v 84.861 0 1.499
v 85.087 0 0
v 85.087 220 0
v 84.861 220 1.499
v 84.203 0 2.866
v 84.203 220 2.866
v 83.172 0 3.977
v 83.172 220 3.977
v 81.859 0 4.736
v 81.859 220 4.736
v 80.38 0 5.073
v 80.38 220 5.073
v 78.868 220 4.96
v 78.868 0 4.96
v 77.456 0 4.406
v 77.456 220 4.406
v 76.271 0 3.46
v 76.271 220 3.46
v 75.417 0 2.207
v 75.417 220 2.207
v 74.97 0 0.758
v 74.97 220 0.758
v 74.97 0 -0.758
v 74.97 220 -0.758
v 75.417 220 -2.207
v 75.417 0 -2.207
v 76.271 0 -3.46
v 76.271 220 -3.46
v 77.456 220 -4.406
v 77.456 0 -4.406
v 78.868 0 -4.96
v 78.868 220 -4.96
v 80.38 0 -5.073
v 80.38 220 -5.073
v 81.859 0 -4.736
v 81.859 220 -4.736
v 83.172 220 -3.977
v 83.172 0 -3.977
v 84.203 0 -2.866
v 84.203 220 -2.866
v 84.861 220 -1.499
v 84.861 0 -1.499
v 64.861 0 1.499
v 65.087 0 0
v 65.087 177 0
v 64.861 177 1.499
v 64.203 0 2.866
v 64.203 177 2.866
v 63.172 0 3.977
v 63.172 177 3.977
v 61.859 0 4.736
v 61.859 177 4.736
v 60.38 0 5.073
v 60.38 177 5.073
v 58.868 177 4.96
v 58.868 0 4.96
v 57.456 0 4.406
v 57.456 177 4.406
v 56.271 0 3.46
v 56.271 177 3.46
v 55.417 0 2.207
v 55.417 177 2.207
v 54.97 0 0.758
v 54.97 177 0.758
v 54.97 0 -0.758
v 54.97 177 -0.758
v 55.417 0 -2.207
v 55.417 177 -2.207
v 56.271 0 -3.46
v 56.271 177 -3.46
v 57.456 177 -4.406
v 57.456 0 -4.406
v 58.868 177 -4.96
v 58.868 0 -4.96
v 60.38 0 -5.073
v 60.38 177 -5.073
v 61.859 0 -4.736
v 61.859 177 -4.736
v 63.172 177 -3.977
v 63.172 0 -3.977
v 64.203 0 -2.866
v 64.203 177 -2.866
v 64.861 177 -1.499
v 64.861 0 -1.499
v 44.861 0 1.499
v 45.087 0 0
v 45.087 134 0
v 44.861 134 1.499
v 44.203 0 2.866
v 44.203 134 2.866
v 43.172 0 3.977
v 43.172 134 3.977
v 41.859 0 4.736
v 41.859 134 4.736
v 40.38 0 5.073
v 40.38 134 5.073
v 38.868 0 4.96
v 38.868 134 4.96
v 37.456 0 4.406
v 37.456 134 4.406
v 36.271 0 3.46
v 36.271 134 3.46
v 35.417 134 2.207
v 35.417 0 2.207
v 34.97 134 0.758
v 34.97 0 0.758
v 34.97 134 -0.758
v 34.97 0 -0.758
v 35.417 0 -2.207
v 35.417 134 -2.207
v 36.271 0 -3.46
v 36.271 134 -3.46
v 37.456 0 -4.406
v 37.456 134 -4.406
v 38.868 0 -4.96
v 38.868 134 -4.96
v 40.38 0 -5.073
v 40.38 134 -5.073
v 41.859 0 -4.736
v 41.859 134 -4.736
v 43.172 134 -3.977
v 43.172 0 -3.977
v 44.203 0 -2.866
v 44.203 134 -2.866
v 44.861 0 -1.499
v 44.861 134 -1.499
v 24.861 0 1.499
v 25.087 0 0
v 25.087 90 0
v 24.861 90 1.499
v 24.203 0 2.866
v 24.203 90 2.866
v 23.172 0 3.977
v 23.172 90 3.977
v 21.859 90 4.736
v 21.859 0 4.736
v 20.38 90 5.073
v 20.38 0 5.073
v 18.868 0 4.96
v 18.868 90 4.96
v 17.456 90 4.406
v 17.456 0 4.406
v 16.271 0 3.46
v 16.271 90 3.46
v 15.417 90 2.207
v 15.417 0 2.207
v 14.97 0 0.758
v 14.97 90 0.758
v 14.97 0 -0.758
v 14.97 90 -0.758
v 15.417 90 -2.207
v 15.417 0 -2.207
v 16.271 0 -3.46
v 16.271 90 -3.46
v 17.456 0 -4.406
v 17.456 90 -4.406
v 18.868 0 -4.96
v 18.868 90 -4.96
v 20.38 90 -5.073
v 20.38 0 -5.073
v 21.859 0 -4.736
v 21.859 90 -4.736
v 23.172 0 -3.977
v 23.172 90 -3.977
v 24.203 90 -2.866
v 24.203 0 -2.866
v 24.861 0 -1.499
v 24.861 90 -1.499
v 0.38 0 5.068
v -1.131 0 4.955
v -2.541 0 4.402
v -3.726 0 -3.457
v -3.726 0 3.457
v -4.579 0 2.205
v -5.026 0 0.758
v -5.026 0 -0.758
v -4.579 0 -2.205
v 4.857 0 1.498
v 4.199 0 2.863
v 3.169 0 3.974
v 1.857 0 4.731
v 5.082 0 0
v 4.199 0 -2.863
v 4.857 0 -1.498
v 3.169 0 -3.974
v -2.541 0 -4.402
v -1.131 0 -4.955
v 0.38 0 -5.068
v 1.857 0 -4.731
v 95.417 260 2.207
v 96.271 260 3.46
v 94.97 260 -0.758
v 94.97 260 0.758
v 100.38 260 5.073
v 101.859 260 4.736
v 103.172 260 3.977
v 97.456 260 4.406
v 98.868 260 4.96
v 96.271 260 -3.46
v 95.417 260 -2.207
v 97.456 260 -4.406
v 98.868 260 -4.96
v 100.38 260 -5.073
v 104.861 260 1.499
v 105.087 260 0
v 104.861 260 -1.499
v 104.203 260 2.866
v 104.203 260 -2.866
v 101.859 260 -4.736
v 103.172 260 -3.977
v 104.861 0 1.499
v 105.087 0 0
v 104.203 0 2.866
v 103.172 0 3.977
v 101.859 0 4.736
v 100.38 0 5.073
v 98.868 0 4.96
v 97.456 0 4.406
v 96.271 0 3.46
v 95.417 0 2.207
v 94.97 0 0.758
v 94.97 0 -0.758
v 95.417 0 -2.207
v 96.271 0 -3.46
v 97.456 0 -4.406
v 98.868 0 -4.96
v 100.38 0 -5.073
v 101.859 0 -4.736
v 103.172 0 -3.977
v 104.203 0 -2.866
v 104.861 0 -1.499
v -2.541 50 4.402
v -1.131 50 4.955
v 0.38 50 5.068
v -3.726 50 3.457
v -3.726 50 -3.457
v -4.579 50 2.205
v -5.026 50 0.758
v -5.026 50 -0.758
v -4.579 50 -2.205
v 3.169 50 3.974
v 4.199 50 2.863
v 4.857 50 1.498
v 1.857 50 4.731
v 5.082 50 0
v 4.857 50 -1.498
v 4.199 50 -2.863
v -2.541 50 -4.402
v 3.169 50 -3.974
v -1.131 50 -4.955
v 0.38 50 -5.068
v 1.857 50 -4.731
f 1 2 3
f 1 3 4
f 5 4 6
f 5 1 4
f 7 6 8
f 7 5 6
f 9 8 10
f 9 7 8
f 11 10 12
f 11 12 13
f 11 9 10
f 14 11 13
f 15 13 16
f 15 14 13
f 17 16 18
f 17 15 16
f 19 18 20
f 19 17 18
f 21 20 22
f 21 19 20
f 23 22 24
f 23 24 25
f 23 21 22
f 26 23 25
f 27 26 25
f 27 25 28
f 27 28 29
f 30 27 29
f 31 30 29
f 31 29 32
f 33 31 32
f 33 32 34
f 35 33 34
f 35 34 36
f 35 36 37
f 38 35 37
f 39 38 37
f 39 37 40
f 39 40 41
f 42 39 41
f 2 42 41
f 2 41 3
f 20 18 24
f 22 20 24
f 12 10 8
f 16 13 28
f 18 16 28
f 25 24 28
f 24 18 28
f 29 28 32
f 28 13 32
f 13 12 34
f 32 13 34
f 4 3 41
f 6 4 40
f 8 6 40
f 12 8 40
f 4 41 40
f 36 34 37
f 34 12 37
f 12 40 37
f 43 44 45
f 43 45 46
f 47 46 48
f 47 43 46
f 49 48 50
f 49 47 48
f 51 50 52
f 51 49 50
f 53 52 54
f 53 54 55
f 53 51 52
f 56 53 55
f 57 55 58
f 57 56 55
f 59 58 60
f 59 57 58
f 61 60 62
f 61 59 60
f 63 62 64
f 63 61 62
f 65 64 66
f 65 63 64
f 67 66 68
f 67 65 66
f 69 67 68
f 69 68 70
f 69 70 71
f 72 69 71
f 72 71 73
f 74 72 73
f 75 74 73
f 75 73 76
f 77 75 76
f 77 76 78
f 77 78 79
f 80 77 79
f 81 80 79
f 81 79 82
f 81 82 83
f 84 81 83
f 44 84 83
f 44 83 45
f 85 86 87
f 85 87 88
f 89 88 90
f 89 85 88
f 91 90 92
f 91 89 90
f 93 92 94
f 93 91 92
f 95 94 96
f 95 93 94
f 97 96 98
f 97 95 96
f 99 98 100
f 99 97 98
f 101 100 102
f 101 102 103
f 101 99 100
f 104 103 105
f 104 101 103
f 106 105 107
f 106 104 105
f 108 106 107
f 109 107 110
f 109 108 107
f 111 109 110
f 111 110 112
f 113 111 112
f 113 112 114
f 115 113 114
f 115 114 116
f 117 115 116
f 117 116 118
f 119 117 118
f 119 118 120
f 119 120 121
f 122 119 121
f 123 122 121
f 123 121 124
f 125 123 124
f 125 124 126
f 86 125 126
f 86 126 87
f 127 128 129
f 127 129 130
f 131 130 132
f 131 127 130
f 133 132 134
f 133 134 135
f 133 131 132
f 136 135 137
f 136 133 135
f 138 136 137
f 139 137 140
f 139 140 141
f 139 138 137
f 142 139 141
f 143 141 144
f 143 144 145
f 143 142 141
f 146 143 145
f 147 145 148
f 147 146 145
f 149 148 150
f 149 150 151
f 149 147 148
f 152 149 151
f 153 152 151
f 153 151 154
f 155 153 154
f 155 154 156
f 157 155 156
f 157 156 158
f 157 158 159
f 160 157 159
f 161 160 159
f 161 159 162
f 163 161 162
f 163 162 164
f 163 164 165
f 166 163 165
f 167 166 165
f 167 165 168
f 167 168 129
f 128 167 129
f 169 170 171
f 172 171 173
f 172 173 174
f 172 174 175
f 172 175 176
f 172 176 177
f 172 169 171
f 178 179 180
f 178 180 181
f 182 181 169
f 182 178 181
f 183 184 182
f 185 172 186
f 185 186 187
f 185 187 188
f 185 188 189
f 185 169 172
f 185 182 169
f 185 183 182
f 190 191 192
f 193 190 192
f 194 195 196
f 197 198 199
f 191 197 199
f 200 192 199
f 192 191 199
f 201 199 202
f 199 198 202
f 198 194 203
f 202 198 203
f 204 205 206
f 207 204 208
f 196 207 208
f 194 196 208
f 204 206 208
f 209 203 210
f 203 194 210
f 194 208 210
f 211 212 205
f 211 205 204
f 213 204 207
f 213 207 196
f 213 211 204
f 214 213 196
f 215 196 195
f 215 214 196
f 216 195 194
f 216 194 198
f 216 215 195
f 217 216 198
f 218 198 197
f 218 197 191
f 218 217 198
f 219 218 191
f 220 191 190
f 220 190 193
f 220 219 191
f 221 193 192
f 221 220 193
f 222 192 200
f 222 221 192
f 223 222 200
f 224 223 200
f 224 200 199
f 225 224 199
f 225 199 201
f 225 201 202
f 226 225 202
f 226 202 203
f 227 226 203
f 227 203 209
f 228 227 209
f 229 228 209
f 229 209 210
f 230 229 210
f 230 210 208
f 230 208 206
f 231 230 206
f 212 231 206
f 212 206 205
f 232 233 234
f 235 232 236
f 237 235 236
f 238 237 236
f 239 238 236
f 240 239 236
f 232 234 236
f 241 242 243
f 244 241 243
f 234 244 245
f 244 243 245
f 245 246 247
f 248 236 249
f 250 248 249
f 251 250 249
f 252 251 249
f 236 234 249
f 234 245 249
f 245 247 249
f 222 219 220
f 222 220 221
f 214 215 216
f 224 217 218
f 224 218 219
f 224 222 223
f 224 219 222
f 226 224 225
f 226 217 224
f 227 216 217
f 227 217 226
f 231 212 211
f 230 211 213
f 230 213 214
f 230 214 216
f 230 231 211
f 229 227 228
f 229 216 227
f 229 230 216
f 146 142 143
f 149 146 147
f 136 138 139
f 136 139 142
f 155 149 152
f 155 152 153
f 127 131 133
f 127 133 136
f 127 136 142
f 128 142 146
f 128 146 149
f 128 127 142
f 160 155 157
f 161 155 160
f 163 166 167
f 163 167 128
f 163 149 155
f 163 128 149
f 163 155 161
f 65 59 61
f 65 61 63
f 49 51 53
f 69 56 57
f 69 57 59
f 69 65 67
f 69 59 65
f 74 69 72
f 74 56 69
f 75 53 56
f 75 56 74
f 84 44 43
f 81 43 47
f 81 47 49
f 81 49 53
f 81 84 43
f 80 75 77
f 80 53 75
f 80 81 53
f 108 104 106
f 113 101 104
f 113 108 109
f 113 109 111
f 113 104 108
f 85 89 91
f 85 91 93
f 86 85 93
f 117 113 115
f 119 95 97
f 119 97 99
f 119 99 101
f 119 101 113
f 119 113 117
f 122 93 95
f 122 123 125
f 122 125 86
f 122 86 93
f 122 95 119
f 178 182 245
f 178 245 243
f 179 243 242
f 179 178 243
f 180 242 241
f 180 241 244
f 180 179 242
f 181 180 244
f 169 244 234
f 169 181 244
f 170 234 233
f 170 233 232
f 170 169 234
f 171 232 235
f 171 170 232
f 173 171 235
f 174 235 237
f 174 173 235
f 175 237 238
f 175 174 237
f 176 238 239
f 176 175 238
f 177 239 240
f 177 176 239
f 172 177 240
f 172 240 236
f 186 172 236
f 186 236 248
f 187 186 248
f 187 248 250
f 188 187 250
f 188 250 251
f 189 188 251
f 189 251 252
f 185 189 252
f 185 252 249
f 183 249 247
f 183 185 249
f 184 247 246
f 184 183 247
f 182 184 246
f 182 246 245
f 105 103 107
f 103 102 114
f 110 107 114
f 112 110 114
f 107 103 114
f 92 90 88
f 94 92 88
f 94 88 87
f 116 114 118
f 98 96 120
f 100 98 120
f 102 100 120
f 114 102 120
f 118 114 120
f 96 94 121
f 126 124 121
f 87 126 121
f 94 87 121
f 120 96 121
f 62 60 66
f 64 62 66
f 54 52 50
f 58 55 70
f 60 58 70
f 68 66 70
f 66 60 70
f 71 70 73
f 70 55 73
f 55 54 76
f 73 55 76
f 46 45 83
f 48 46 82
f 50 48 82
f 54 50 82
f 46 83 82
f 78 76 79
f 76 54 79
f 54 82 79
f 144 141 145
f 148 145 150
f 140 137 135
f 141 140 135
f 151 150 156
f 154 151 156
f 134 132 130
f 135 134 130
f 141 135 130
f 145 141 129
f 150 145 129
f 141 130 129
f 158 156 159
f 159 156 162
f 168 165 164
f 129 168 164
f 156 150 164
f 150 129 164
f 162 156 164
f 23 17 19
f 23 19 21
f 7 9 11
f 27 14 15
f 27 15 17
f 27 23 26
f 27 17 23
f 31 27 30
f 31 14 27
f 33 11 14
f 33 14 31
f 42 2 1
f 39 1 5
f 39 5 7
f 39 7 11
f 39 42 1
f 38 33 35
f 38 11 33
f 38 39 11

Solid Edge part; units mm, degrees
sketch "Sketch1" plane through (0, 0, 0) normal (0, -1, 0) x (1, 0, 0)
  circle A0 centre (0, 0) radius 5.0825
extrude "Protrusion1" add sketch "Sketch1" against normal blind 50
sketch "Sketch2" plane through (0, 0, 0) normal (0, -1, 0) x (1, 0, 0)
  circle A0 centre (20, 0) radius 5.0872
extrude "ExtrudedProtrusion_10" add sketch "Sketch2" against normal blind 90
sketch "Sketch3" plane through (0, 0, 0) normal (0, -1, 0) x (1, 0, 0)
  circle A0 centre (40, 0) radius 5.0872
extrude "ExtrudedProtrusion_11" add sketch "Sketch3" against normal blind 134
sketch "Sketch4" plane through (0, 0, 0) normal (0, -1, 0) x (1, 0, 0)
  circle A0 centre (60, 0) radius 5.0872
extrude "ExtrudedProtrusion_12" add sketch "Sketch4" against normal blind 177
sketch "Sketch5" plane through (0, 0, 0) normal (0, -1, 0) x (1, 0, 0)
  circle A0 centre (80, 0) radius 5.0872
extrude "ExtrudedProtrusion_13" add sketch "Sketch5" against normal blind 220
sketch "Sketch6" plane through (0, 0, 0) normal (0, -1, 0) x (1, 0, 0)
  circle A0 centre (100, 0) radius 5.0872
extrude "ExtrudedProtrusion_14" add sketch "Sketch6" against normal blind 260
